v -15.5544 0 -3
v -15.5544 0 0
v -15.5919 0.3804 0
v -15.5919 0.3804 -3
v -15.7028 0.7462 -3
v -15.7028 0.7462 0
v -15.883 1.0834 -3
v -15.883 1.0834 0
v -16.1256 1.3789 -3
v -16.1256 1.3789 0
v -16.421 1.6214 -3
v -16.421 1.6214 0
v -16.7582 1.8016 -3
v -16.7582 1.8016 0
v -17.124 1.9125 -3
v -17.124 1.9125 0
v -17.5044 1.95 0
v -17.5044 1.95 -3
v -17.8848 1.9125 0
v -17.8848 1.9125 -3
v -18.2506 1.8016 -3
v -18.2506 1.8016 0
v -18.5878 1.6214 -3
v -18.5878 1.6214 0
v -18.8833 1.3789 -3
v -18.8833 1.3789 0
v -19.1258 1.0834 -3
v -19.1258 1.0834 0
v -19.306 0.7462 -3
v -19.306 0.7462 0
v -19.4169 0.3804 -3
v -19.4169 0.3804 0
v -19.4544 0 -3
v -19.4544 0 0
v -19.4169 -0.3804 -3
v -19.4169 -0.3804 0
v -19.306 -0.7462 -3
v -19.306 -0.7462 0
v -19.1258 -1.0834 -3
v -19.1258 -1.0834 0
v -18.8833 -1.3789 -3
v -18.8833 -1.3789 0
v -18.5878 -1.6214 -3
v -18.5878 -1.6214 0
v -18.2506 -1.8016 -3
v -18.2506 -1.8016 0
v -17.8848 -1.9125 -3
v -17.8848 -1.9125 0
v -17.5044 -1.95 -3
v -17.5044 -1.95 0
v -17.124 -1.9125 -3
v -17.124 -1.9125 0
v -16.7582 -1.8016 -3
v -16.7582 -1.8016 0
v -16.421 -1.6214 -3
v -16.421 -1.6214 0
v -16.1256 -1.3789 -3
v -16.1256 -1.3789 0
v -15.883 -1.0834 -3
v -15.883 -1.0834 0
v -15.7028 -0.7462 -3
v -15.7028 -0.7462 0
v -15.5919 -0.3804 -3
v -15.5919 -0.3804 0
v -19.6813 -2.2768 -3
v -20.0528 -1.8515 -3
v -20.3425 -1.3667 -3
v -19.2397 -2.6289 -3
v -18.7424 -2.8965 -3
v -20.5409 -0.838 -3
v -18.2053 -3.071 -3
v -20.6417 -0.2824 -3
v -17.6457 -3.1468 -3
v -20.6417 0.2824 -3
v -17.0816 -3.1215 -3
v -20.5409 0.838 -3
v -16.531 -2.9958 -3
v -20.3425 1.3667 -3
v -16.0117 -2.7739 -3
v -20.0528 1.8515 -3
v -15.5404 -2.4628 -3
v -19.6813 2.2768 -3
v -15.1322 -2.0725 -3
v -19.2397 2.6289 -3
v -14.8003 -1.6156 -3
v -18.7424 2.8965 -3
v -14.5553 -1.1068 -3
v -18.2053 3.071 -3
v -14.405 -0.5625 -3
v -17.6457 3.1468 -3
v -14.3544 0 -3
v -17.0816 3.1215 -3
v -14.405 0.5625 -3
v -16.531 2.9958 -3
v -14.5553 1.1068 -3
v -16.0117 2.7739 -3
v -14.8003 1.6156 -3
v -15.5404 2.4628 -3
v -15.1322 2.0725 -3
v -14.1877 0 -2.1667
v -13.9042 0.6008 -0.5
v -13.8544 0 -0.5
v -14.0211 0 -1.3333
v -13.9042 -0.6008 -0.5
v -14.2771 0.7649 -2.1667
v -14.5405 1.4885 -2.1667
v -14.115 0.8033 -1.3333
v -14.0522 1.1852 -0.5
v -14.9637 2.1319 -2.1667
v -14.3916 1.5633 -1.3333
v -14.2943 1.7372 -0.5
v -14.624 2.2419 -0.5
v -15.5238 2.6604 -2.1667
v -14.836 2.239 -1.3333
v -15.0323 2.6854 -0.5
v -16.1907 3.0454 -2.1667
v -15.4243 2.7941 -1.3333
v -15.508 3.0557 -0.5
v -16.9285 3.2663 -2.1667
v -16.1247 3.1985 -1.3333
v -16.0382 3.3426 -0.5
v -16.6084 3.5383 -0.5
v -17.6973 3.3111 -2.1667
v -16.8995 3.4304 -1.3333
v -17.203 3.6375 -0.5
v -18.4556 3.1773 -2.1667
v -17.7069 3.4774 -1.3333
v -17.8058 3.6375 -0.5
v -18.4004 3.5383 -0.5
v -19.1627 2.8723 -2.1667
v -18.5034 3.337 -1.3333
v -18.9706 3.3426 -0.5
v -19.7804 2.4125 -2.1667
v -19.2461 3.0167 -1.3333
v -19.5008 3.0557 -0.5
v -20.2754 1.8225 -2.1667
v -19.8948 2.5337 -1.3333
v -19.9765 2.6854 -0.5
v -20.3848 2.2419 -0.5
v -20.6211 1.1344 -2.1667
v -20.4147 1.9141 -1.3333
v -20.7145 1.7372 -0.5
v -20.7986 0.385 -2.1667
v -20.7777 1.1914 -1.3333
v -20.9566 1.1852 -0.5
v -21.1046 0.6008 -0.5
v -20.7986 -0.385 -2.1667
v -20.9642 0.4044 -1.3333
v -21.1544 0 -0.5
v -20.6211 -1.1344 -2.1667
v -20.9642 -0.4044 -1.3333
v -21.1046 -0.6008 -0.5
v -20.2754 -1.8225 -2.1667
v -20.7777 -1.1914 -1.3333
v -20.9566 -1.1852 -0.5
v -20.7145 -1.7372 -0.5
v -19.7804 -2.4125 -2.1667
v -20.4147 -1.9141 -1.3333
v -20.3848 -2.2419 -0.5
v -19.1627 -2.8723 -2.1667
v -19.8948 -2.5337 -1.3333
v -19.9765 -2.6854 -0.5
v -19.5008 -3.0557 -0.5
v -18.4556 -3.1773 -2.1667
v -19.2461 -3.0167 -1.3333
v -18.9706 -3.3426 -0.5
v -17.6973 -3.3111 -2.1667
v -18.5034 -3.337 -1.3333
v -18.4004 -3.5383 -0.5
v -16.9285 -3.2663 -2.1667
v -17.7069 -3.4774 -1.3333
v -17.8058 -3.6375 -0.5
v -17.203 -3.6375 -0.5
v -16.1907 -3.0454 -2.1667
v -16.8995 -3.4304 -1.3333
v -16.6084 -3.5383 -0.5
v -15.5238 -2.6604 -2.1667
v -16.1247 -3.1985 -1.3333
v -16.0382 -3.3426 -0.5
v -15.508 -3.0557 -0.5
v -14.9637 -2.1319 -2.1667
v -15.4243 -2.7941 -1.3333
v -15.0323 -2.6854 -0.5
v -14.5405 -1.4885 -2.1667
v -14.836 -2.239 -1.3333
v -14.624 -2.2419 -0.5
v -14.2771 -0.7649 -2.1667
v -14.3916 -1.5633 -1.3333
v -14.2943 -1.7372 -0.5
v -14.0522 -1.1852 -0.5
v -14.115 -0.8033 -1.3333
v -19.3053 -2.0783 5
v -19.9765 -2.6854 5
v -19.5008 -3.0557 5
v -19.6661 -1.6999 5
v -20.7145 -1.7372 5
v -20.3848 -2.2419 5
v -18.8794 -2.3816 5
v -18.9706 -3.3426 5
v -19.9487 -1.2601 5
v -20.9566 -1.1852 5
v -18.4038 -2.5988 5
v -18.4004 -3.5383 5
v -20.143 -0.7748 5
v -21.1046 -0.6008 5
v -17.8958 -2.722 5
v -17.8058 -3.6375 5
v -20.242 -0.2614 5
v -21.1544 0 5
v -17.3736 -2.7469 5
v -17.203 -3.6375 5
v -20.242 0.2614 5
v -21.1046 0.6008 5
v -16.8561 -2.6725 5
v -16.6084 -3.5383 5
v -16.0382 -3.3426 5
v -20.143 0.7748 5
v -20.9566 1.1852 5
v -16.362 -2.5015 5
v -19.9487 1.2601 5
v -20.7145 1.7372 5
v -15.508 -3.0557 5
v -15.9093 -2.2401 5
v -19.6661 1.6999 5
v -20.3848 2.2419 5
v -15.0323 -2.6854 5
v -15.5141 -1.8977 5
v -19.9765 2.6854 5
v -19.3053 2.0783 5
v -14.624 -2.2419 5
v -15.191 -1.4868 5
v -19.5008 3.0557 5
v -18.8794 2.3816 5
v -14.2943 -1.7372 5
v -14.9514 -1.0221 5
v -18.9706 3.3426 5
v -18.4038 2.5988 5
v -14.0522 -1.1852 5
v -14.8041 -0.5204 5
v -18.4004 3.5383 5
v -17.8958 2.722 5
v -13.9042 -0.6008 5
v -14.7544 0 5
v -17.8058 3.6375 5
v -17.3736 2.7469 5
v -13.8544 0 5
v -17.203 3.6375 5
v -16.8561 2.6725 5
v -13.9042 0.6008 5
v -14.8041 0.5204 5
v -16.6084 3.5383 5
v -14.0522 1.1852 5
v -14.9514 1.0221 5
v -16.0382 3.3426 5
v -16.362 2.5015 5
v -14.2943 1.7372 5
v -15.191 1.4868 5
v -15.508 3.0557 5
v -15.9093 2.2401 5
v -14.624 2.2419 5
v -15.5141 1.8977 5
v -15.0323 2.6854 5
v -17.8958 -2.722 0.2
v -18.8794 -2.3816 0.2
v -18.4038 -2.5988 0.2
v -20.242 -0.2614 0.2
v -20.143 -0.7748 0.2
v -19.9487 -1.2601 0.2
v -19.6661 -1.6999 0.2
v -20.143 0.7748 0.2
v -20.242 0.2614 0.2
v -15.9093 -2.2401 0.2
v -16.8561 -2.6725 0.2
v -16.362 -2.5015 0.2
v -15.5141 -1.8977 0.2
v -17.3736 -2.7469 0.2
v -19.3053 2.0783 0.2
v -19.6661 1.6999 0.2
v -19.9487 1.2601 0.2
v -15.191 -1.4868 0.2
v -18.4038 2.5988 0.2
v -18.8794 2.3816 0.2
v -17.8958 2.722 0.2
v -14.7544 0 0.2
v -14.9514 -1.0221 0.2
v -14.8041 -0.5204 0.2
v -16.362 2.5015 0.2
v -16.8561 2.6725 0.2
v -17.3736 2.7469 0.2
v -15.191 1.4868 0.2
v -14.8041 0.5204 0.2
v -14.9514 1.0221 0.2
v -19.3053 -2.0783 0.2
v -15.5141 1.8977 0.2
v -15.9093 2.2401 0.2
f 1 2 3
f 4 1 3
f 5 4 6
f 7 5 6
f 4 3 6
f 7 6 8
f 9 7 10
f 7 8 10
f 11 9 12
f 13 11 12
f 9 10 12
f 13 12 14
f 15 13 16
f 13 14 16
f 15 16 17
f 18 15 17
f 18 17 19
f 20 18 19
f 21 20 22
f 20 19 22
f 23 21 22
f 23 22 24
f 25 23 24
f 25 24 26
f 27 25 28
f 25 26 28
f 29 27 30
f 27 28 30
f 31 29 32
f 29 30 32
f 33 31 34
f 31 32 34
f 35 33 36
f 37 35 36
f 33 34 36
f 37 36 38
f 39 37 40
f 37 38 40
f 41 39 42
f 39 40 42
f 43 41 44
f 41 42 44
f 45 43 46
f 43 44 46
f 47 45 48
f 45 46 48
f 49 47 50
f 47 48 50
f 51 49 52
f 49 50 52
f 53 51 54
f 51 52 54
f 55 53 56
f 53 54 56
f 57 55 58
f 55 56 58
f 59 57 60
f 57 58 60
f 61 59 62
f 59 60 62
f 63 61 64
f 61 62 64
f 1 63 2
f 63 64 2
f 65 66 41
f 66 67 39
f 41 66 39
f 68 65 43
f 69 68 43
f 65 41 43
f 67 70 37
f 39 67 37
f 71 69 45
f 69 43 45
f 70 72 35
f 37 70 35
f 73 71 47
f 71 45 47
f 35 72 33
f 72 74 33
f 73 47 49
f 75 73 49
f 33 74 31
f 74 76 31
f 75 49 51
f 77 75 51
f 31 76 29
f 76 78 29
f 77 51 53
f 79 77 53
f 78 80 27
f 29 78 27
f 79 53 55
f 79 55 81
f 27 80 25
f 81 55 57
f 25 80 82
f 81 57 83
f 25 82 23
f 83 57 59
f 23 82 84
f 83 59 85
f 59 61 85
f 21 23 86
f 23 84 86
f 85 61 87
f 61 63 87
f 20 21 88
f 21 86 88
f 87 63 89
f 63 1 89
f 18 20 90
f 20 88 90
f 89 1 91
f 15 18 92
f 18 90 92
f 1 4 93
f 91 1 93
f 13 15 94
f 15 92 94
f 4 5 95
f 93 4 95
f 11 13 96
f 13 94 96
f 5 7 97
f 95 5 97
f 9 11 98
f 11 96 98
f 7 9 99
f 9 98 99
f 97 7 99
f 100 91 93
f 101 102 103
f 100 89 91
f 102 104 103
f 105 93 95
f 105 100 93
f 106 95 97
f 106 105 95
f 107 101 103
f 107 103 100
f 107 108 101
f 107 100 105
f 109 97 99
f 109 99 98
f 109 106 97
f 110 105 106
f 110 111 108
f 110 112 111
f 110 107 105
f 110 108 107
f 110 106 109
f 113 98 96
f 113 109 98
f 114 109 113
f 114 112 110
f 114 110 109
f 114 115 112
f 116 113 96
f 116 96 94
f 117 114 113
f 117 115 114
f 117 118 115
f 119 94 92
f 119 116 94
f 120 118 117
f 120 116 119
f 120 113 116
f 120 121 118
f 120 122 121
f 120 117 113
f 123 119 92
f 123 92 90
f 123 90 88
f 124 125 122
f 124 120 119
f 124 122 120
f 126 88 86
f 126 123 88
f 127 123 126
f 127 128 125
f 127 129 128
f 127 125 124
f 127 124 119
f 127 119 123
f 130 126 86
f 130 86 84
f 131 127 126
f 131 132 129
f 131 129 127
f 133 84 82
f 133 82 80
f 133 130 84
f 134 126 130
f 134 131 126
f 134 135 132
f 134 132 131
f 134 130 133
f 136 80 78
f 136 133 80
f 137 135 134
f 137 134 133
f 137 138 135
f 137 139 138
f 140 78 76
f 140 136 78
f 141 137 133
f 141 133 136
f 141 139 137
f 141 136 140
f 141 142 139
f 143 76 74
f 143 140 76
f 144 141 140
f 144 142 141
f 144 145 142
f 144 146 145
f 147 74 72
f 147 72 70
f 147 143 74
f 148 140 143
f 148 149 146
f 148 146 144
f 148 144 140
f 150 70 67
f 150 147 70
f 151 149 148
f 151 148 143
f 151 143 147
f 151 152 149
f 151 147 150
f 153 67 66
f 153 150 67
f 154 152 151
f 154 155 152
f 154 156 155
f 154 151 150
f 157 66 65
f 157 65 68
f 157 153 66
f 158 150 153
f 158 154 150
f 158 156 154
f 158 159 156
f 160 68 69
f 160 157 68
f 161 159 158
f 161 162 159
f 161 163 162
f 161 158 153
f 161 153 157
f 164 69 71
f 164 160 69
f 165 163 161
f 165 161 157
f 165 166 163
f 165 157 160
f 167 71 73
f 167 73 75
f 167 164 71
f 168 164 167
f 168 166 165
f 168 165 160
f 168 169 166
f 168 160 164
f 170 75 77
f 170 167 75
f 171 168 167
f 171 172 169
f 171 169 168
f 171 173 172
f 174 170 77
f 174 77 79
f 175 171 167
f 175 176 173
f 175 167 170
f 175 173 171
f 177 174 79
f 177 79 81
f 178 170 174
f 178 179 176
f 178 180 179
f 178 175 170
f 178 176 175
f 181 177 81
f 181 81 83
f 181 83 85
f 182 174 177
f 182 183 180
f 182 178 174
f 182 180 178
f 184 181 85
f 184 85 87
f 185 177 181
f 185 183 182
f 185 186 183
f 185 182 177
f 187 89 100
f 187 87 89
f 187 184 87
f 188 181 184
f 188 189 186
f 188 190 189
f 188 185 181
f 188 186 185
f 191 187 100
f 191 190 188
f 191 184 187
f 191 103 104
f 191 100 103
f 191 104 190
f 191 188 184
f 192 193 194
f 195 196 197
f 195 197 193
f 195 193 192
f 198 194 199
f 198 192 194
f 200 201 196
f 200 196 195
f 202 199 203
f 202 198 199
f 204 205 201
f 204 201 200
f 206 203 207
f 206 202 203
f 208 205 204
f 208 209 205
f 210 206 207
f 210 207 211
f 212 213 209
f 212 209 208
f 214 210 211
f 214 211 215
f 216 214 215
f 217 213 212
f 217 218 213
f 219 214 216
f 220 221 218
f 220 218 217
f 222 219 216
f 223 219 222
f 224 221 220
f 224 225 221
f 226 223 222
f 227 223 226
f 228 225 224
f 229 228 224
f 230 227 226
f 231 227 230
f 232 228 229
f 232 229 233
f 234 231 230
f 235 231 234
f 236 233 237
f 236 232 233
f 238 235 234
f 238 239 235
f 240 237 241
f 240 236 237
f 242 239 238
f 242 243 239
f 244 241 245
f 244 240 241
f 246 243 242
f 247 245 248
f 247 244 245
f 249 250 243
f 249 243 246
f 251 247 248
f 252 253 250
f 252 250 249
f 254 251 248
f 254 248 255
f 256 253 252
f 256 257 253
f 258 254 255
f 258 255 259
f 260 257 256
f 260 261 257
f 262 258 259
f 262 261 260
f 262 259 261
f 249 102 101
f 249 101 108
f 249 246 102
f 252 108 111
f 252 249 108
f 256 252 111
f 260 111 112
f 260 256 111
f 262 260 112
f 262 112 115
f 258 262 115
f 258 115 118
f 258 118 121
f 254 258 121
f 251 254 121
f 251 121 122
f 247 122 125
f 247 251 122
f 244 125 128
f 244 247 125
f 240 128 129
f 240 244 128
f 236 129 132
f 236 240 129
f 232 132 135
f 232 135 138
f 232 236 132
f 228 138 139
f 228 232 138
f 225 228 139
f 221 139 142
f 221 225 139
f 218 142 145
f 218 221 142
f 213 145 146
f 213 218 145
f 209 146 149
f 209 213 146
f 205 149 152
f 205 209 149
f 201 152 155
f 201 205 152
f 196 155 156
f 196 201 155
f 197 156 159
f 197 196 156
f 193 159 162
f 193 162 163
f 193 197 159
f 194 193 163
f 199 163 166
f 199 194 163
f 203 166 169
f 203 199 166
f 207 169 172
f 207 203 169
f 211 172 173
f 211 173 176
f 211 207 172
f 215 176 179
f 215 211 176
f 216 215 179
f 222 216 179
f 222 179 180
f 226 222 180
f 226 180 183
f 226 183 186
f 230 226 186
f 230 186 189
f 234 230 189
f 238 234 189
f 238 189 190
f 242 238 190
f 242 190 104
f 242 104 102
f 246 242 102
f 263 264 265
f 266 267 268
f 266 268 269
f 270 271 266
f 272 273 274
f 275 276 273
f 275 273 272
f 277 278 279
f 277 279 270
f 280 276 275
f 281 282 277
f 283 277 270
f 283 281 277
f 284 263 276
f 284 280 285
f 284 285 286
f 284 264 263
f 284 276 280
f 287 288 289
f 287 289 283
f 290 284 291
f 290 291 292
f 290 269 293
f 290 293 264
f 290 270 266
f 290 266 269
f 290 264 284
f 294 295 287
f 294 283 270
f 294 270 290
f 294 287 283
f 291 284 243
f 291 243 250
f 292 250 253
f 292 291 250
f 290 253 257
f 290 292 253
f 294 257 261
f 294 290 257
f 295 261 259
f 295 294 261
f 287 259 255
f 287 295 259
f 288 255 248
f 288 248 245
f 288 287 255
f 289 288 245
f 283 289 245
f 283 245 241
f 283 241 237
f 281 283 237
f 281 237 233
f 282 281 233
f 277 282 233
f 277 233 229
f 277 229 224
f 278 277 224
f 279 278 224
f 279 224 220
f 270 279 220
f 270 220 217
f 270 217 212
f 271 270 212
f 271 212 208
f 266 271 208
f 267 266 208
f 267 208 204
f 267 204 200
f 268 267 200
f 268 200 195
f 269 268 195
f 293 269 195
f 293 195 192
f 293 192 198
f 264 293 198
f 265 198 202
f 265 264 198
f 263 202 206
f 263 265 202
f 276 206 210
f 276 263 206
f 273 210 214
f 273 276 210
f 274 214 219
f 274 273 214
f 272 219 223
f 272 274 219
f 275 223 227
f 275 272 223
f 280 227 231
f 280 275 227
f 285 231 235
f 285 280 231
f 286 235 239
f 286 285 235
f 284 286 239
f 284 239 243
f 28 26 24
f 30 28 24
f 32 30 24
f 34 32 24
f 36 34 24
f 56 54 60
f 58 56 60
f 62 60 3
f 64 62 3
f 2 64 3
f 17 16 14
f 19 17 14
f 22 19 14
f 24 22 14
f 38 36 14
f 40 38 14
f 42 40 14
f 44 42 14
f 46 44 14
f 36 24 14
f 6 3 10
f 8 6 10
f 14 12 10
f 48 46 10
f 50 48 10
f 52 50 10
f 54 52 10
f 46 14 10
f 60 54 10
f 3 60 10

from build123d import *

# Parameters (mm, degrees)
F0_R     = 3.65
F0_R_2   = 2.75
F0_R_3   = 1.95
F1_DEPTH = 3
F2_DEPTH = 5
F3_SIZE2 = 2.5
F3_SIZE  = 0.5
F4_DEPTH = 0.2


with BuildPart() as f1:
    # F0 (on Top) → F1 (new body)
    with BuildSketch(Plane.XY):
        with Locations((-17.504408526, 0)):
            Circle(F0_R)
        with Locations((-17.504408526, 0)):
            Circle(F0_R_2, mode=Mode.SUBTRACT)
        with Locations((-17.504408526, 0)):
            Circle(F0_R_2)
        with Locations((-17.504408526, 0)):
            Circle(F0_R_3, mode=Mode.SUBTRACT)
    extrude(amount=-F1_DEPTH)

    # F0 (on Top) → F2 (join)
    with BuildSketch(Plane.XY):
        with Locations((-17.504408526, 0)):
            Circle(F0_R)
        with Locations((-17.504408526, 0)):
            Circle(F0_R_2, mode=Mode.SUBTRACT)
    extrude(amount=F2_DEPTH)

    # F3
    f3_edges = [f1.edges().sort_by_distance(p)[0] for p in [
        (-21.154409, 0, -3),
    ]]
    f3_side = f1.faces().sort_by_distance((-21.051171, 0, -3))[0]
    chamfer(f3_edges, length=F3_SIZE, length2=F3_SIZE2, reference=f3_side)

    # F0 (on Top) → F4 (join)
    with BuildSketch(Plane.XY):
        with Locations((-17.504408526, 0)):
            Circle(F0_R_2)
        with Locations((-17.504408526, 0)):
            Circle(F0_R_3, mode=Mode.SUBTRACT)
        with Locations((-17.504408526, 0)):
            Circle(F0_R_3)
    extrude(amount=F4_DEPTH)


solid = f1.part
